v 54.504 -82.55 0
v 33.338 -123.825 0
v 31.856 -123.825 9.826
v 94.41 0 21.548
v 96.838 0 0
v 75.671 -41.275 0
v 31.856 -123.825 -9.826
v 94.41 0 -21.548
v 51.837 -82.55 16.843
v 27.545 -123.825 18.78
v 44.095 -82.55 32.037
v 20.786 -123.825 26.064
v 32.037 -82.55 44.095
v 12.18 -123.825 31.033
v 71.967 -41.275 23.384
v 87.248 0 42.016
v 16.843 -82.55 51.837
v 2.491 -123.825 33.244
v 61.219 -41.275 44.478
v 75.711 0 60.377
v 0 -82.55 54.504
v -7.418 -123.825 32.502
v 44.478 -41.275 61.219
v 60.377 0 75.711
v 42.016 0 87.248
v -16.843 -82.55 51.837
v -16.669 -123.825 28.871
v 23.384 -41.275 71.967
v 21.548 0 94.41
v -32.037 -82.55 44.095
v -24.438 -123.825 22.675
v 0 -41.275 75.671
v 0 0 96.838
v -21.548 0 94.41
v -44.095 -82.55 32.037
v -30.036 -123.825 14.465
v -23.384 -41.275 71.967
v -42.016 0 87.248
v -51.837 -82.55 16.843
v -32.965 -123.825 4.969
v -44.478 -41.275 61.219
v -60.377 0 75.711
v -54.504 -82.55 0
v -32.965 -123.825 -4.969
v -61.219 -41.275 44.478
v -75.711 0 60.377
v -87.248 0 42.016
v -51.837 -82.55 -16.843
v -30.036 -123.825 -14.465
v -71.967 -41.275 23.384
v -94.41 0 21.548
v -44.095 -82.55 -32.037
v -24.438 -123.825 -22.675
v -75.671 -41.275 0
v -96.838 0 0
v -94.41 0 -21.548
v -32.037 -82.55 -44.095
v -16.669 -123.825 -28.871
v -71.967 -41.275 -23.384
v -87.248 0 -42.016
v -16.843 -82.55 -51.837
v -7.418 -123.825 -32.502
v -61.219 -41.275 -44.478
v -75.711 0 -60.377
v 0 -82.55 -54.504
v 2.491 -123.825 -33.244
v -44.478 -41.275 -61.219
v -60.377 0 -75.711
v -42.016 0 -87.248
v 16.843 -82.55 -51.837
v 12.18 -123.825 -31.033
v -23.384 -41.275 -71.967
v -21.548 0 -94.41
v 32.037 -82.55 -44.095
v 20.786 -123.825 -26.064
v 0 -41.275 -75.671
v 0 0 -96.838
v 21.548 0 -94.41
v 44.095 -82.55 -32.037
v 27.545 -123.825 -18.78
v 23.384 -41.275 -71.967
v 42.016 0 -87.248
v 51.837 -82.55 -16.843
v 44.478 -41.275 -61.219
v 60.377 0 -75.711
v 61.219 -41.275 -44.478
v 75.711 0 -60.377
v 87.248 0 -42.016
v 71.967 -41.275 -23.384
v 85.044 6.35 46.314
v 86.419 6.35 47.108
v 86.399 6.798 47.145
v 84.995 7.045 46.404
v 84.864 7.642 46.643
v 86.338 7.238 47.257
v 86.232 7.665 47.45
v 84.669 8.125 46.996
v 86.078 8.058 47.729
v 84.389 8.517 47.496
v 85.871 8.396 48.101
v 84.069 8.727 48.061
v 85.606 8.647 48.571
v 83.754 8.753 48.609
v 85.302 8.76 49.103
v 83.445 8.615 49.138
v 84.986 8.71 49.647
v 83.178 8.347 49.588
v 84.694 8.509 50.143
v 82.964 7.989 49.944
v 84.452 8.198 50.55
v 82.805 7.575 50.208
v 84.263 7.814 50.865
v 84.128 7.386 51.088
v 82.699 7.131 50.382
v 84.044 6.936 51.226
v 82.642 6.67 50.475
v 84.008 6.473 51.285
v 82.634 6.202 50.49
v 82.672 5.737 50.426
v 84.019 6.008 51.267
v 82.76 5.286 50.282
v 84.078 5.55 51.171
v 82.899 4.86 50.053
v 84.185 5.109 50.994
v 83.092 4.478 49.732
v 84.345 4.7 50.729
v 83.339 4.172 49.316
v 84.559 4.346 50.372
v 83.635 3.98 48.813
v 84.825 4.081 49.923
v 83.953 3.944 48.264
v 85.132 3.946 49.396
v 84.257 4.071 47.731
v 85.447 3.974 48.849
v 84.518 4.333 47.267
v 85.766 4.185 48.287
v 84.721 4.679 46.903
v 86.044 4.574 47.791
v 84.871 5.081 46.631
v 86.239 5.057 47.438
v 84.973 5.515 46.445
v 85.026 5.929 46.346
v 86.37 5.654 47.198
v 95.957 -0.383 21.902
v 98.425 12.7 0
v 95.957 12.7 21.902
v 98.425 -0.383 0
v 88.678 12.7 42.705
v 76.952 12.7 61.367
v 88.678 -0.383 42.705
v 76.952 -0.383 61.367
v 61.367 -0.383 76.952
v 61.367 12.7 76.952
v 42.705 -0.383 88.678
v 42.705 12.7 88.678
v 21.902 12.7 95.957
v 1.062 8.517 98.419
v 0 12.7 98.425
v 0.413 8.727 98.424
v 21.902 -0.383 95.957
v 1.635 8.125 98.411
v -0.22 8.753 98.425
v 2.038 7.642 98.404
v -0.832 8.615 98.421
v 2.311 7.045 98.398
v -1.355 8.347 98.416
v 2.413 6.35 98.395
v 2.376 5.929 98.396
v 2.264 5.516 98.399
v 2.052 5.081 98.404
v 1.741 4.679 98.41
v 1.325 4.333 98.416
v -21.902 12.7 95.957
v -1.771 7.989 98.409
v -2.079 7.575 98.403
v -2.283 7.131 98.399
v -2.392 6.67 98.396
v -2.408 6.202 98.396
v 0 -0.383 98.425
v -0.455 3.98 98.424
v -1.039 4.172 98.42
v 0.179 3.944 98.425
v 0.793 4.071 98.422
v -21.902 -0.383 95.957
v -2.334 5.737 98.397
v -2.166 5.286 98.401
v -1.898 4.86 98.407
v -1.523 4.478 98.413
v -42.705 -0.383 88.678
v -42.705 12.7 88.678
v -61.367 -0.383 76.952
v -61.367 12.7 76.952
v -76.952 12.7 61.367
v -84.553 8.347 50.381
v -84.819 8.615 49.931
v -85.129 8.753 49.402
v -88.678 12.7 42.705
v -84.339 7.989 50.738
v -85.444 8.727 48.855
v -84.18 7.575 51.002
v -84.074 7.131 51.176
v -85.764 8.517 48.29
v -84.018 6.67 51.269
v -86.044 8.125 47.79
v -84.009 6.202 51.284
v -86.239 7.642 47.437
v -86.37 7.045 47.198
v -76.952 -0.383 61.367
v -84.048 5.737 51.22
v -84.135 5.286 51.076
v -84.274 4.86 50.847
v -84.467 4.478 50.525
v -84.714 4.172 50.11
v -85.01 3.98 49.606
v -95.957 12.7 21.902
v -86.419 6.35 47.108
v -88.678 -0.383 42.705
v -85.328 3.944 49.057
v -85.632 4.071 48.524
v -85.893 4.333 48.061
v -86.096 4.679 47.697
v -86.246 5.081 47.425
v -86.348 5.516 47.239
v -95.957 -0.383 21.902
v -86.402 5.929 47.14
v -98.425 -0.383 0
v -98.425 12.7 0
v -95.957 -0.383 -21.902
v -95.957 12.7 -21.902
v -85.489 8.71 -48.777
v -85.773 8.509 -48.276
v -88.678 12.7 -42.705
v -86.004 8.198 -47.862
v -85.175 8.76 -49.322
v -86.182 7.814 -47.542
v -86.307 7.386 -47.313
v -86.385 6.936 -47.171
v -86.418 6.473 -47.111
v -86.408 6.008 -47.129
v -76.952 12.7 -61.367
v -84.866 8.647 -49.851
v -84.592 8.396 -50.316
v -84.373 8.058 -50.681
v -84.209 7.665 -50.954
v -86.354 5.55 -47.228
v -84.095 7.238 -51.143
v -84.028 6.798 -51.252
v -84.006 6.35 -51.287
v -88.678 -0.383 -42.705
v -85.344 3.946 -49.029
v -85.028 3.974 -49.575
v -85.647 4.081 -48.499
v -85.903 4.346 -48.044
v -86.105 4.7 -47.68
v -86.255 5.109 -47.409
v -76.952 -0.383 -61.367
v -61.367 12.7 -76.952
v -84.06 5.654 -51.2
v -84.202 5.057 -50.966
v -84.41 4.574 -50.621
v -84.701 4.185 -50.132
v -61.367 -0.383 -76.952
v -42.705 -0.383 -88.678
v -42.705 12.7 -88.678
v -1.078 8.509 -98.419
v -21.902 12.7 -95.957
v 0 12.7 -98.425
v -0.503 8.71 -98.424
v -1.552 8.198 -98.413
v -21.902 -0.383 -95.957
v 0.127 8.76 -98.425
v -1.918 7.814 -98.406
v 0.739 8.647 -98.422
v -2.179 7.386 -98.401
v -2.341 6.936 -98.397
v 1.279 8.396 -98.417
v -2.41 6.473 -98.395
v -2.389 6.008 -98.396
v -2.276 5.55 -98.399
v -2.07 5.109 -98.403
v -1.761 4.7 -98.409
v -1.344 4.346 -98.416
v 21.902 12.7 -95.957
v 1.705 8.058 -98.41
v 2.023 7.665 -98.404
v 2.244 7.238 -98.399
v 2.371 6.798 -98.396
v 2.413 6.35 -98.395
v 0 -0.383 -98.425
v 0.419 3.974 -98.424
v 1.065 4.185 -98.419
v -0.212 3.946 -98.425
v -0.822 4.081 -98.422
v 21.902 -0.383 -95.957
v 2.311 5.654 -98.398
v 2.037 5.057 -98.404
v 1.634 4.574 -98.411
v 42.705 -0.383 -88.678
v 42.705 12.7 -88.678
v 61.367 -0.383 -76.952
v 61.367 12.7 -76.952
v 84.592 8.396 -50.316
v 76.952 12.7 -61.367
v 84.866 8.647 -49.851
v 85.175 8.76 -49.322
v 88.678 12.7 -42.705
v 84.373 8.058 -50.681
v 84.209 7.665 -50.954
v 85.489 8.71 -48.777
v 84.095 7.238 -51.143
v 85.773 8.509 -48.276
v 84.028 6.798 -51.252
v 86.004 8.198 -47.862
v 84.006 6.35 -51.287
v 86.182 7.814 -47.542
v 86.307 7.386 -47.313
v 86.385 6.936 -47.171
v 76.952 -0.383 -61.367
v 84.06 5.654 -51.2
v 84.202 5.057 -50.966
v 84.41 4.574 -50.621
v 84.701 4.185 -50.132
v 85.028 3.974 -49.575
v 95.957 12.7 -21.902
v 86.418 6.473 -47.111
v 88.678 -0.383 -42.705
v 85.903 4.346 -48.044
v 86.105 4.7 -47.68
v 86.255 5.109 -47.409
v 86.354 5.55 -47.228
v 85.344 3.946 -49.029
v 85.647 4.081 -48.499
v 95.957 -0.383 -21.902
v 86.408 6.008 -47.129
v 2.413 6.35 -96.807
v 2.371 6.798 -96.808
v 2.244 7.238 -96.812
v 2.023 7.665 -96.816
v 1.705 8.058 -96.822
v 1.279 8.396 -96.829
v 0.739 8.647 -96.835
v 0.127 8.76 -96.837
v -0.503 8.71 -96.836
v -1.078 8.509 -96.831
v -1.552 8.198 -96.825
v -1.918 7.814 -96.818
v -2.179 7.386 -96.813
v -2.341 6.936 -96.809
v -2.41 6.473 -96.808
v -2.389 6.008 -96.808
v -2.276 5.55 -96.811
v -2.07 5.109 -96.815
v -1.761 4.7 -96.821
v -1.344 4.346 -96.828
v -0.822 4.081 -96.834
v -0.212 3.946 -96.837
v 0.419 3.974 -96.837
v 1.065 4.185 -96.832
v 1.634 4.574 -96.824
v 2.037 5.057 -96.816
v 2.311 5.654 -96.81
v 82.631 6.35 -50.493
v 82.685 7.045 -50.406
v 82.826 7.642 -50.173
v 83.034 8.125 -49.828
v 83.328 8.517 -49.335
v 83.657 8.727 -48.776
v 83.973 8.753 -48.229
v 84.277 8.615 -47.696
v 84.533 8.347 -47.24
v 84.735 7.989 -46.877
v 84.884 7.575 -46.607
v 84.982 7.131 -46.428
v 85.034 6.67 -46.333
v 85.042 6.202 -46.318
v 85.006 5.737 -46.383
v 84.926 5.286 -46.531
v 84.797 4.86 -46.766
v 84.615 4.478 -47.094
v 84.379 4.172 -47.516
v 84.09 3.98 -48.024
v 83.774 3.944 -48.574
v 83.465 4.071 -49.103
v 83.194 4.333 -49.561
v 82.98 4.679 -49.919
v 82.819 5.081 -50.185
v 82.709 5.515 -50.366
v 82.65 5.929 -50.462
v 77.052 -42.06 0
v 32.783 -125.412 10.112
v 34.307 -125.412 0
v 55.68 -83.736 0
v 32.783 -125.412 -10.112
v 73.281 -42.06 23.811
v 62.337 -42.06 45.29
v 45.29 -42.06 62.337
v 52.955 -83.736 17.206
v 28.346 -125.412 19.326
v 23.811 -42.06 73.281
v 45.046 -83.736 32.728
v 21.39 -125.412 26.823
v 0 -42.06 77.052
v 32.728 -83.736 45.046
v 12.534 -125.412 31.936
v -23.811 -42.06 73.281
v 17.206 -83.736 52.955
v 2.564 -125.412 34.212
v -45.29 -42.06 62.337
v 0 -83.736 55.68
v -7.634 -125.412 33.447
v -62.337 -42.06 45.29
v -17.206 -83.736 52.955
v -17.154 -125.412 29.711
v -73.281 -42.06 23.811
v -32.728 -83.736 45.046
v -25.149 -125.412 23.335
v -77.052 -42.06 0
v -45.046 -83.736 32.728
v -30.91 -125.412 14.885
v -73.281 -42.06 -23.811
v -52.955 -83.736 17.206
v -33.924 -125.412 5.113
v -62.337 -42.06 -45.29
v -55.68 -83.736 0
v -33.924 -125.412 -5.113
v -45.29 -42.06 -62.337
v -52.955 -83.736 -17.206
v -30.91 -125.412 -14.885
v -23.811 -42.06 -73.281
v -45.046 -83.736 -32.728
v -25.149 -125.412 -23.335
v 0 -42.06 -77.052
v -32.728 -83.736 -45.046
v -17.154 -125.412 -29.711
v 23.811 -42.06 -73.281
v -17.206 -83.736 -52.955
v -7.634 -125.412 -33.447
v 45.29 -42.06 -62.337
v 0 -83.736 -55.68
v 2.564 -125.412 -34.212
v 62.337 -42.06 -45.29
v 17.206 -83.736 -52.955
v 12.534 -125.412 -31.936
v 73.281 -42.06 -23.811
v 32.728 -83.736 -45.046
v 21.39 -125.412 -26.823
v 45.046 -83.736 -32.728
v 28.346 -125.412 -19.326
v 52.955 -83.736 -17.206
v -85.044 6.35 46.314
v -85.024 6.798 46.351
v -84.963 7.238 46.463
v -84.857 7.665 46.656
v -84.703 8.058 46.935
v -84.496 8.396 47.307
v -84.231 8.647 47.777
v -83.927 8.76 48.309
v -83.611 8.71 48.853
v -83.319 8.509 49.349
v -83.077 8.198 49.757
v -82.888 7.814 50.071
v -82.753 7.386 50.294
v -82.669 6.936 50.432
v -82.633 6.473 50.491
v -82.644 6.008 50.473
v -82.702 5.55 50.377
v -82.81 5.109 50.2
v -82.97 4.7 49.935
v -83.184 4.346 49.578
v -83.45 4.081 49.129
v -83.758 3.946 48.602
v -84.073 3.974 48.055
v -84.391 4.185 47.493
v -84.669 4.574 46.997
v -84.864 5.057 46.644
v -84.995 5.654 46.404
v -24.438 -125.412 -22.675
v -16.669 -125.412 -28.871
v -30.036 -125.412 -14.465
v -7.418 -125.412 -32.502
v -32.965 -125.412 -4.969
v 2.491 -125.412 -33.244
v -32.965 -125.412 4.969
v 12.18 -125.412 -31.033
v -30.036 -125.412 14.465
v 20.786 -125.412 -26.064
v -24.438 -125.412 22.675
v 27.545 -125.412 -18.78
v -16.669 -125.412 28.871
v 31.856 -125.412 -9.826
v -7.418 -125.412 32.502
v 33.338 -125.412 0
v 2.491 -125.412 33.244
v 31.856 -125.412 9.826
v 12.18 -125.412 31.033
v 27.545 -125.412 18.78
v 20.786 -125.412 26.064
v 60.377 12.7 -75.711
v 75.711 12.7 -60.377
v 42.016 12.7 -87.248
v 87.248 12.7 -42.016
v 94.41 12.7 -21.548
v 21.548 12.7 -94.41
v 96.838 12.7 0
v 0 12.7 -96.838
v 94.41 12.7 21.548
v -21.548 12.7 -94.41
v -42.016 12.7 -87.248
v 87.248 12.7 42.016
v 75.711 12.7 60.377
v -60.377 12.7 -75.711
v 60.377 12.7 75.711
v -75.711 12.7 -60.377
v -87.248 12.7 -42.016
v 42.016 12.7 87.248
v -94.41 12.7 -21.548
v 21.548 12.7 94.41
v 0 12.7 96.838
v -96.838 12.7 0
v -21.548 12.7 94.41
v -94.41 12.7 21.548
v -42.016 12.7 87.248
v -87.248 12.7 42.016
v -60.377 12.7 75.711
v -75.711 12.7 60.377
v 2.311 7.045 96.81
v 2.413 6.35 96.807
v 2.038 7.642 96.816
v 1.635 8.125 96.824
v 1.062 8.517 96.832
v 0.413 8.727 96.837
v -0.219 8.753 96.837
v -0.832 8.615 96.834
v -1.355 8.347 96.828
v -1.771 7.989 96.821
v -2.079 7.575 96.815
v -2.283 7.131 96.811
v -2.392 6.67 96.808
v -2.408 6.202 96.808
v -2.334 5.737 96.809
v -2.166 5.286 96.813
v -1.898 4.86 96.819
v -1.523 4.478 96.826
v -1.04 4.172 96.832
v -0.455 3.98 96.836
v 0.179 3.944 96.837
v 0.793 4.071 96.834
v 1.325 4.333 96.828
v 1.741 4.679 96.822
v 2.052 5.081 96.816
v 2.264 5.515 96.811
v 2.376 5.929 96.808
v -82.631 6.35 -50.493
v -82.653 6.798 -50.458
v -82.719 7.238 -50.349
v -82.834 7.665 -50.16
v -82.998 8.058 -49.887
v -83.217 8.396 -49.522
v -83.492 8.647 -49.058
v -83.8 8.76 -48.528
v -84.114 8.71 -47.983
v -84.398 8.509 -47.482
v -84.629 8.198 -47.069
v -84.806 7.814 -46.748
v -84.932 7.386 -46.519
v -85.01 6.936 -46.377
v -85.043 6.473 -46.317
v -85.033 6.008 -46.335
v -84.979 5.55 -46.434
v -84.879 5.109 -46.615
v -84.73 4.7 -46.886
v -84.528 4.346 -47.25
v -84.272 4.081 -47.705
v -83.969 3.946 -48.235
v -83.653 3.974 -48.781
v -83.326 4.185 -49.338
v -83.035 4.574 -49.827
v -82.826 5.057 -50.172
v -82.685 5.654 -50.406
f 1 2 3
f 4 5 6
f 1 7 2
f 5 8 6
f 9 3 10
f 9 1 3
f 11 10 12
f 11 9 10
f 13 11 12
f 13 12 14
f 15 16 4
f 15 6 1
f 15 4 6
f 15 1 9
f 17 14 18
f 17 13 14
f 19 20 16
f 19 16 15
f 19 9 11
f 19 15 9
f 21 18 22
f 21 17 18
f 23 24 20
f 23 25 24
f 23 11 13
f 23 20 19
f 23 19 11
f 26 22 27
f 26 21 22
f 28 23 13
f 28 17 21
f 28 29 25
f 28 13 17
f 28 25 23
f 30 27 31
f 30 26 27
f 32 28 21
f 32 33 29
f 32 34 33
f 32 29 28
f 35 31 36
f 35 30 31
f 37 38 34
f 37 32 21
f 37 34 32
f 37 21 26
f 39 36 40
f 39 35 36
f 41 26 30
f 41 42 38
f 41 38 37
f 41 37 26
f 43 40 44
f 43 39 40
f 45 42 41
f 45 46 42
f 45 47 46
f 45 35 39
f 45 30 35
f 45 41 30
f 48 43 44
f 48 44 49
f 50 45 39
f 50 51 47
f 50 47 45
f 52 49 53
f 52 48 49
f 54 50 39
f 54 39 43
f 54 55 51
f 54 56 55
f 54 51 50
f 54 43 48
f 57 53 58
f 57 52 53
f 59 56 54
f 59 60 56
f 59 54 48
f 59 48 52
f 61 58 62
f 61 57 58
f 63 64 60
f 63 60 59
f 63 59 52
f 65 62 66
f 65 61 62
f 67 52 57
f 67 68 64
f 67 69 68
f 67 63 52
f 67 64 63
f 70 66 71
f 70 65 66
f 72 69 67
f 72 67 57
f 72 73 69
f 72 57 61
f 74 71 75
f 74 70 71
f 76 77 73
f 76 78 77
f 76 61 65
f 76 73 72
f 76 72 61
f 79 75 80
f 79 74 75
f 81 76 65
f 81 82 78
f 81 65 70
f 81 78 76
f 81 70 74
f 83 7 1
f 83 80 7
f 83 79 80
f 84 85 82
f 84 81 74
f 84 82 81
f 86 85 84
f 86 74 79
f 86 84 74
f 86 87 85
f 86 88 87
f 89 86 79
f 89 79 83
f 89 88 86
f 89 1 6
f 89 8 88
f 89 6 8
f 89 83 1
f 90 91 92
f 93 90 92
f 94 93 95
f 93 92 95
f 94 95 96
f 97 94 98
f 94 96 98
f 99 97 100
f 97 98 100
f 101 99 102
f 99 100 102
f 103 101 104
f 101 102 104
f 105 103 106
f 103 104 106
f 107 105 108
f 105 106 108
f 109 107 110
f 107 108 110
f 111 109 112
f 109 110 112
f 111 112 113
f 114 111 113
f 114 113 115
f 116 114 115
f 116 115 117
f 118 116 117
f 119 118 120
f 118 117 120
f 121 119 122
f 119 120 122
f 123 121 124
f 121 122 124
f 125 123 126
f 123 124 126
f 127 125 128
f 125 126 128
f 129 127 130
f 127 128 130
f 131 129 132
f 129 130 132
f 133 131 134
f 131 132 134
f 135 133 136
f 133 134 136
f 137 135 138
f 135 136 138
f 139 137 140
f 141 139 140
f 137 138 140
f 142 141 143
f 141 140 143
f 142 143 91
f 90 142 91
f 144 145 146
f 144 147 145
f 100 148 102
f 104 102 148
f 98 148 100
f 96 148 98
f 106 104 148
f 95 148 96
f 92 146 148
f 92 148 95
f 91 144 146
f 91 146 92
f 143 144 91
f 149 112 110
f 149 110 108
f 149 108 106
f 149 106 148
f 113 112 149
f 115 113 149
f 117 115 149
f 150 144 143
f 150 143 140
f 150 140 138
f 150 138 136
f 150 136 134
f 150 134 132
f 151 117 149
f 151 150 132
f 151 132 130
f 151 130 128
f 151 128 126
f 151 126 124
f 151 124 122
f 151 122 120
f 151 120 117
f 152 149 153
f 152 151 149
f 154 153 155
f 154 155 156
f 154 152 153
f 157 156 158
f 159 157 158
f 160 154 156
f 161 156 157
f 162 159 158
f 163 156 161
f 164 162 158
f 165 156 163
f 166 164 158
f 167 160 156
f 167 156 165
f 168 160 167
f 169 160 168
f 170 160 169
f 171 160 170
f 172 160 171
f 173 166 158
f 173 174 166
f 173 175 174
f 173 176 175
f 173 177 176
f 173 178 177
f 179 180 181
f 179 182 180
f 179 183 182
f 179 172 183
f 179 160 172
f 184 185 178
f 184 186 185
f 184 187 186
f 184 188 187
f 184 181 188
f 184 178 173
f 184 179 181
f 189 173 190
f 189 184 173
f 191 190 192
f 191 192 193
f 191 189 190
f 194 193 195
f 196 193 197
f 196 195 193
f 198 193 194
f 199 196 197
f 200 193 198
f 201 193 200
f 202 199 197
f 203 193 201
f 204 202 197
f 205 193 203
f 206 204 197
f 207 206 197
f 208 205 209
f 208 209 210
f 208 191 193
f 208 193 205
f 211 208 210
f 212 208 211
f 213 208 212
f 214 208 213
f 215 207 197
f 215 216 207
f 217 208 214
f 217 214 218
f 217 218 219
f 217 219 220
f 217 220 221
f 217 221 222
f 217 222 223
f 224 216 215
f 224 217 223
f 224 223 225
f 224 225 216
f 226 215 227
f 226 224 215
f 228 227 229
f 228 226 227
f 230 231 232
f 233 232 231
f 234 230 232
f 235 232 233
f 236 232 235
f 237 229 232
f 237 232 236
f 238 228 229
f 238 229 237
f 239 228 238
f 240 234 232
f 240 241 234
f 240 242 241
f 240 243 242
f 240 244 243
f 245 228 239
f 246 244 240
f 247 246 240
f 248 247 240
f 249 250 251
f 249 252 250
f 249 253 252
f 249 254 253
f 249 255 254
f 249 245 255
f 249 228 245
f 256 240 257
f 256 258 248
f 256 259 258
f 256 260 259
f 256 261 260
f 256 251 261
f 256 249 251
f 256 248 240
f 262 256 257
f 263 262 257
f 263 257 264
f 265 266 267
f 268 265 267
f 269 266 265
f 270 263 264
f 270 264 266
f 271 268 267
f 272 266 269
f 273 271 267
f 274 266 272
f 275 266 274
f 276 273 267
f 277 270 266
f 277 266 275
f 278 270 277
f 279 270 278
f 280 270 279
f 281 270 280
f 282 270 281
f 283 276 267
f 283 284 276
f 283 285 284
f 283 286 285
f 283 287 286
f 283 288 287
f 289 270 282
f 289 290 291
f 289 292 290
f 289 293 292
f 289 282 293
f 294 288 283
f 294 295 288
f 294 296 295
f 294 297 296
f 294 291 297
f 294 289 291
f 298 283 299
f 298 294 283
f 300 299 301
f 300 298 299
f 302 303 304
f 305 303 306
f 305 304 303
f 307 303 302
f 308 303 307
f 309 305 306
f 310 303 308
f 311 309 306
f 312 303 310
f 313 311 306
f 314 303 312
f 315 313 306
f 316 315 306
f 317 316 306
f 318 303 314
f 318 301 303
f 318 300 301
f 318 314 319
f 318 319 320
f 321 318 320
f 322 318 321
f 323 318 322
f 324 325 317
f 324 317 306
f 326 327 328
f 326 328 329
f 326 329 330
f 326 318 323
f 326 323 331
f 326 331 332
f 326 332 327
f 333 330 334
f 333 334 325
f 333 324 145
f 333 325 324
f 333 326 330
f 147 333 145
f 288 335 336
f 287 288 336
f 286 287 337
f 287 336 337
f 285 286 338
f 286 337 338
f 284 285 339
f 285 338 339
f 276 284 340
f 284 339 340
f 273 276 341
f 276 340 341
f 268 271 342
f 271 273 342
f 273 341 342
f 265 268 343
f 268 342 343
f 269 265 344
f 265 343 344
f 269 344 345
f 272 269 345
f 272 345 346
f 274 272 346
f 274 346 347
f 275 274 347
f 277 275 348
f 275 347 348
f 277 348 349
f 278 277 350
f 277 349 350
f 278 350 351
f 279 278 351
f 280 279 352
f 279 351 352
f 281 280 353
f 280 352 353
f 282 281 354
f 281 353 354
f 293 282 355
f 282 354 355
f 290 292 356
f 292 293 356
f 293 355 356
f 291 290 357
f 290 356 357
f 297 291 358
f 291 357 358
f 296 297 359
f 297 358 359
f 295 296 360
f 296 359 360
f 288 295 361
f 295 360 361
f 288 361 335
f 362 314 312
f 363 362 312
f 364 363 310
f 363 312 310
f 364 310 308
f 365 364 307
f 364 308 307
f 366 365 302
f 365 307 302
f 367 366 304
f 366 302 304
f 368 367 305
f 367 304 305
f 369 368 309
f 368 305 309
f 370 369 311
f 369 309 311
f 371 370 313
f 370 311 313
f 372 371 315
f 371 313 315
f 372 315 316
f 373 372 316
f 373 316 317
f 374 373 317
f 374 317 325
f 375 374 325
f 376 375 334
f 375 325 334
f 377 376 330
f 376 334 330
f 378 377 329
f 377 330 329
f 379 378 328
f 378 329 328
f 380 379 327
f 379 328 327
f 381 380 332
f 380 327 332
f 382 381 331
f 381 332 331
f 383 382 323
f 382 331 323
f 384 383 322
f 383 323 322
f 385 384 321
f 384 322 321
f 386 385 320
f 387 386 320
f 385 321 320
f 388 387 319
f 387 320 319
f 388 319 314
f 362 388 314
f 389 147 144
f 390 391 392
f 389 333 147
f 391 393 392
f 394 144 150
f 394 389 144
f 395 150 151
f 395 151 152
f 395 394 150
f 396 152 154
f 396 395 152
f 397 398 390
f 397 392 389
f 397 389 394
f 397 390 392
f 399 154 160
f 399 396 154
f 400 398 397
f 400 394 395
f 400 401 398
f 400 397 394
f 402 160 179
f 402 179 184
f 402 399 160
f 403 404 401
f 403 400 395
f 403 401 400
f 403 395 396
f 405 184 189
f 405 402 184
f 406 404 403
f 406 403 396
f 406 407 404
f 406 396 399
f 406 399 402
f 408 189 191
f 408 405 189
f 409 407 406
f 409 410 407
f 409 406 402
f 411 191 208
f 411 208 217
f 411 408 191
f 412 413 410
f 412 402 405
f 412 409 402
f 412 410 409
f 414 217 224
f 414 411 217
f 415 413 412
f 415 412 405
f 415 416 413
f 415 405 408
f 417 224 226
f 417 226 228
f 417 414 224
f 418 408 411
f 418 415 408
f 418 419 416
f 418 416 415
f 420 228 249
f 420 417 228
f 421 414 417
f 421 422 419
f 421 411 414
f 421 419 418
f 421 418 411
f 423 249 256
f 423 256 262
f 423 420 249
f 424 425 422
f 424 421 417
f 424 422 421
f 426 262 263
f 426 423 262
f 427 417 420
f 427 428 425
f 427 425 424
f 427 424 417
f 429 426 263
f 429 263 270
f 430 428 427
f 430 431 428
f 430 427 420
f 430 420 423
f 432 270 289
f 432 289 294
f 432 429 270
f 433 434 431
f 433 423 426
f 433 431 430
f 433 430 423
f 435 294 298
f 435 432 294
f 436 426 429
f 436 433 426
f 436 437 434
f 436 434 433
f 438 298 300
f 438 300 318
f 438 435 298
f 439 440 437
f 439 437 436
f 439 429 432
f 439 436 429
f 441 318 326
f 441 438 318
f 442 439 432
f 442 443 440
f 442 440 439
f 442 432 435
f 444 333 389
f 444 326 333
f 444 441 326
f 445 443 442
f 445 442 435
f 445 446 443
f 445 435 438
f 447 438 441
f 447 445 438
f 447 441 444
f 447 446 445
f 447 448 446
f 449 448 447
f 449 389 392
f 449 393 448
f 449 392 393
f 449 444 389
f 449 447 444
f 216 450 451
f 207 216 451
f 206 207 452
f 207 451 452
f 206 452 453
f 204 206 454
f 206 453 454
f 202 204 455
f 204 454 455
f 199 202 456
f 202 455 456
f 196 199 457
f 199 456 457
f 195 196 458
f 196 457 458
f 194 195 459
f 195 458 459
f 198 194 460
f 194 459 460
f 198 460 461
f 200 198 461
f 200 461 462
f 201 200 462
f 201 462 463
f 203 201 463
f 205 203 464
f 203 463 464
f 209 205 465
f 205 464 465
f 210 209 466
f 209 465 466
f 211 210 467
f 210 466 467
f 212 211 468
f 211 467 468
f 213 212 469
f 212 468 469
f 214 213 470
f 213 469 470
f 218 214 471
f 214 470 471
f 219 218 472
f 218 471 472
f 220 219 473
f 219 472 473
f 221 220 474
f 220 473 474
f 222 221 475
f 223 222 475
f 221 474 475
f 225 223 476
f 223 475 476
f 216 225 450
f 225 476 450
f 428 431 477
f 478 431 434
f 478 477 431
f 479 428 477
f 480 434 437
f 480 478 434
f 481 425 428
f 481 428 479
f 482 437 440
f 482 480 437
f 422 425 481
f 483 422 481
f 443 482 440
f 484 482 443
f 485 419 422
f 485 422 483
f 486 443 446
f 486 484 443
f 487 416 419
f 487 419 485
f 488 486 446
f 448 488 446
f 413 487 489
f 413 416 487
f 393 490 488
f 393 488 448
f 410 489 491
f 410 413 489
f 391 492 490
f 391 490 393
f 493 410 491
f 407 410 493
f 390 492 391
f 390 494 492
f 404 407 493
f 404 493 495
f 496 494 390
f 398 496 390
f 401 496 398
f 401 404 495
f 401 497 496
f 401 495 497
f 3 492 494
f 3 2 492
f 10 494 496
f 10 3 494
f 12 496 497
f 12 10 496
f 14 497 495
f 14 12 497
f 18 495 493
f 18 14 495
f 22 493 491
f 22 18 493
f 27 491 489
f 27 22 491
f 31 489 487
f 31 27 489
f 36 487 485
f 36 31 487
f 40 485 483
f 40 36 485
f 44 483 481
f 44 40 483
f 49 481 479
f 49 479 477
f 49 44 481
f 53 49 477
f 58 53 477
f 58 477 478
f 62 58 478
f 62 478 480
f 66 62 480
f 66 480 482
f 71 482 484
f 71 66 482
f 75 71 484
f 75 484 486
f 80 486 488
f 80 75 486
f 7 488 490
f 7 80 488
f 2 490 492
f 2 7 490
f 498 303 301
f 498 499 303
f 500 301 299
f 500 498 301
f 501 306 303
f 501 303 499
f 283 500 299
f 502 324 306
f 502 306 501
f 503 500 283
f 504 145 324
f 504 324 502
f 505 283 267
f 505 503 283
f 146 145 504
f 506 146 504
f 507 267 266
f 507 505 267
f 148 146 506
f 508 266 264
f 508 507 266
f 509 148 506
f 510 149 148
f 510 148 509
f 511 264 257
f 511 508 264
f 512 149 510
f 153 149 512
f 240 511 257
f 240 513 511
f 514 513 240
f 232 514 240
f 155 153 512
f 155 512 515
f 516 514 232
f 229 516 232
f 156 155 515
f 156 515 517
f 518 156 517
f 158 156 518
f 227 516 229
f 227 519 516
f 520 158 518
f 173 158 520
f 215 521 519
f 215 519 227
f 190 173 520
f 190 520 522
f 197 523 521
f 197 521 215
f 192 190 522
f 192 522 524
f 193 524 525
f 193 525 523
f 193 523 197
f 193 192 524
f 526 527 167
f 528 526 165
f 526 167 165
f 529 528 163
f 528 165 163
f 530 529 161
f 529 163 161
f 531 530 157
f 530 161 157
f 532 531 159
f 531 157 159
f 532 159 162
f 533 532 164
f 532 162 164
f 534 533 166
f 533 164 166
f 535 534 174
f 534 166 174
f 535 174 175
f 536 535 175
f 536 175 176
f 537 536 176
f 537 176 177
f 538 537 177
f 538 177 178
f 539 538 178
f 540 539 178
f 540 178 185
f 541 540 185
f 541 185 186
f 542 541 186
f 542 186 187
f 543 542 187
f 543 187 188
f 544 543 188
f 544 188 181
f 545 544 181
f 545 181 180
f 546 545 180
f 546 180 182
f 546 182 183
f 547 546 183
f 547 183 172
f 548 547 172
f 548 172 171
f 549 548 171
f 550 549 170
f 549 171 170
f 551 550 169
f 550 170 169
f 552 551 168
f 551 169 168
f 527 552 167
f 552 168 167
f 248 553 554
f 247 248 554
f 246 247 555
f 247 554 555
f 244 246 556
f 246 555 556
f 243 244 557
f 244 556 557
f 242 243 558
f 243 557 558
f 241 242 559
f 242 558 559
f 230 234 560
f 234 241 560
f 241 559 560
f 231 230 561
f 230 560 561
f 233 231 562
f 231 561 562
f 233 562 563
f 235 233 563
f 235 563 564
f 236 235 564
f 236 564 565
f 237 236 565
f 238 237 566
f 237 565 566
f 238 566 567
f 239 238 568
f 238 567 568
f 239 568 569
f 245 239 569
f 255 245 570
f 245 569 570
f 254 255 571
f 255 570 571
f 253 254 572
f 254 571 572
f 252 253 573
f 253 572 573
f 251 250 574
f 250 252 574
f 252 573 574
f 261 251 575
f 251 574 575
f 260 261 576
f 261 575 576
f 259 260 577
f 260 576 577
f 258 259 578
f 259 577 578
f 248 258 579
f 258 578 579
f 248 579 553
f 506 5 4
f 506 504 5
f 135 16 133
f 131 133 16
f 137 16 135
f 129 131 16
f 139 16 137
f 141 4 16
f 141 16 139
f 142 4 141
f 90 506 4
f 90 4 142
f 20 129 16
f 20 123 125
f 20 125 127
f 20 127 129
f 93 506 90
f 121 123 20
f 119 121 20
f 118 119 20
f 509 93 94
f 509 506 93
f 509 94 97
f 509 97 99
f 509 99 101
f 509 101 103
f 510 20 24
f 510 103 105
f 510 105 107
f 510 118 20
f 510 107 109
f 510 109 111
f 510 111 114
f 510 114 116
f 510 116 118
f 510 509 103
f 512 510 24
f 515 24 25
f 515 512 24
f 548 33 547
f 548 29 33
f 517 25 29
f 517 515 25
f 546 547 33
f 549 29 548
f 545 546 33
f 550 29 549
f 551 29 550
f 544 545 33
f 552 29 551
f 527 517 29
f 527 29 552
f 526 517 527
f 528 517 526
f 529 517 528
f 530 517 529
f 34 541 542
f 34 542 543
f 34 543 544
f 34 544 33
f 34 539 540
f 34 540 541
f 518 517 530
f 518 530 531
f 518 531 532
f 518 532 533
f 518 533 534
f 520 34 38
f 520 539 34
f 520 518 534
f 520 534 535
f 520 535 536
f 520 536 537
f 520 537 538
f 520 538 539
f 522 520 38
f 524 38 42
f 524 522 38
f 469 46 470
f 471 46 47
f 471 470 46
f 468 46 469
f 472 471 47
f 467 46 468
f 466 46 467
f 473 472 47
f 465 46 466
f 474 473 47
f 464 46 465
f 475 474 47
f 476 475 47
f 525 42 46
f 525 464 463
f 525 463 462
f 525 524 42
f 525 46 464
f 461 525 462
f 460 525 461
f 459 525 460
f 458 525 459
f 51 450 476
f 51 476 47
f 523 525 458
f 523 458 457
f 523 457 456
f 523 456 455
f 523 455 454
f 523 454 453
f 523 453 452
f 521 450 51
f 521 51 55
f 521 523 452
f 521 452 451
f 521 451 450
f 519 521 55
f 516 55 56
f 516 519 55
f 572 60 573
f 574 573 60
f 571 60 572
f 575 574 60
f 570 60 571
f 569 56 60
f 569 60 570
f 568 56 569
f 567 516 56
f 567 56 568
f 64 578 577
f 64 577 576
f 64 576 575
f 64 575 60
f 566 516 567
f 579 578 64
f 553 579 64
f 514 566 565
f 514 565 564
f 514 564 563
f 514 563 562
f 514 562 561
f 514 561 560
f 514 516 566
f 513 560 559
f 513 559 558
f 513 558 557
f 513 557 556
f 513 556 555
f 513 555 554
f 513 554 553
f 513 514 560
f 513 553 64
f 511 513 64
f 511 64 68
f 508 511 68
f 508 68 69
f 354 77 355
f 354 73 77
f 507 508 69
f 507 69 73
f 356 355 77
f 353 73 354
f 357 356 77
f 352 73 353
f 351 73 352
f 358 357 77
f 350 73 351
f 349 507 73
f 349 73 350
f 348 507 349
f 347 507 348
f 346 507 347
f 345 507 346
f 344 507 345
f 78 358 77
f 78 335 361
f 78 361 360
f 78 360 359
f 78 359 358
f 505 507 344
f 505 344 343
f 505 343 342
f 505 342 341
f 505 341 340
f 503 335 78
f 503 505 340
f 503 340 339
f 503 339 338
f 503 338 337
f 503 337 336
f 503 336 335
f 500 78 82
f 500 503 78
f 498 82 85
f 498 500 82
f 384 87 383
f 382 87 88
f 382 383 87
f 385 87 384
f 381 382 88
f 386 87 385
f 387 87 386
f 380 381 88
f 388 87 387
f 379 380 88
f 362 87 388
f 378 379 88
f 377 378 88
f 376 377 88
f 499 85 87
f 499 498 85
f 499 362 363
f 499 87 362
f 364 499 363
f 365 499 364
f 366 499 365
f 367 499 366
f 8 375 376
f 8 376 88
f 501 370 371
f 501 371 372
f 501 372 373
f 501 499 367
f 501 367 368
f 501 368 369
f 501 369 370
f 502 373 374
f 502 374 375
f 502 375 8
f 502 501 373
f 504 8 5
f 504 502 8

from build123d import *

# Parameters (mm, degrees)
SKETCH2_R          = 2.413
CUT_EXTRUDE1_DEPTH = 99.425
CIRPATTERN1_COUNT  = 6


with BuildPart() as part:
    # Sketch1 → Revolve1 (revolve)
    with BuildSketch(Plane.XY):
        Polygon((96.8375, 0), (96.8375, 12.7), (98.425, 12.7), (98.425, -0.383318861), (34.307471211, -125.4125), (33.3375, -125.4125), (33.3375, -123.825), align=None)
    revolve(axis=Axis((0, 0, 0), (0, -1, 0)))

    # Sketch2 → Cut-Extrude1 (cut, symmetric)
    with BuildSketch(Plane.XY):
        with Locations((0, 6.35)):
            Circle(SKETCH2_R)
    cut_extrude1 = extrude(amount=CUT_EXTRUDE1_DEPTH, both=True, mode=Mode.SUBTRACT)

    # CirPattern1: Cut-Extrude1 ×6 about axis
    cirpattern1_axis = Axis((0, 12.7, 0), (0, 1, 0))
    for i in range(1, CIRPATTERN1_COUNT):
        add(cut_extrude1.rotate(cirpattern1_axis, i * 360 / CIRPATTERN1_COUNT), mode=Mode.SUBTRACT)


solid = part.part
